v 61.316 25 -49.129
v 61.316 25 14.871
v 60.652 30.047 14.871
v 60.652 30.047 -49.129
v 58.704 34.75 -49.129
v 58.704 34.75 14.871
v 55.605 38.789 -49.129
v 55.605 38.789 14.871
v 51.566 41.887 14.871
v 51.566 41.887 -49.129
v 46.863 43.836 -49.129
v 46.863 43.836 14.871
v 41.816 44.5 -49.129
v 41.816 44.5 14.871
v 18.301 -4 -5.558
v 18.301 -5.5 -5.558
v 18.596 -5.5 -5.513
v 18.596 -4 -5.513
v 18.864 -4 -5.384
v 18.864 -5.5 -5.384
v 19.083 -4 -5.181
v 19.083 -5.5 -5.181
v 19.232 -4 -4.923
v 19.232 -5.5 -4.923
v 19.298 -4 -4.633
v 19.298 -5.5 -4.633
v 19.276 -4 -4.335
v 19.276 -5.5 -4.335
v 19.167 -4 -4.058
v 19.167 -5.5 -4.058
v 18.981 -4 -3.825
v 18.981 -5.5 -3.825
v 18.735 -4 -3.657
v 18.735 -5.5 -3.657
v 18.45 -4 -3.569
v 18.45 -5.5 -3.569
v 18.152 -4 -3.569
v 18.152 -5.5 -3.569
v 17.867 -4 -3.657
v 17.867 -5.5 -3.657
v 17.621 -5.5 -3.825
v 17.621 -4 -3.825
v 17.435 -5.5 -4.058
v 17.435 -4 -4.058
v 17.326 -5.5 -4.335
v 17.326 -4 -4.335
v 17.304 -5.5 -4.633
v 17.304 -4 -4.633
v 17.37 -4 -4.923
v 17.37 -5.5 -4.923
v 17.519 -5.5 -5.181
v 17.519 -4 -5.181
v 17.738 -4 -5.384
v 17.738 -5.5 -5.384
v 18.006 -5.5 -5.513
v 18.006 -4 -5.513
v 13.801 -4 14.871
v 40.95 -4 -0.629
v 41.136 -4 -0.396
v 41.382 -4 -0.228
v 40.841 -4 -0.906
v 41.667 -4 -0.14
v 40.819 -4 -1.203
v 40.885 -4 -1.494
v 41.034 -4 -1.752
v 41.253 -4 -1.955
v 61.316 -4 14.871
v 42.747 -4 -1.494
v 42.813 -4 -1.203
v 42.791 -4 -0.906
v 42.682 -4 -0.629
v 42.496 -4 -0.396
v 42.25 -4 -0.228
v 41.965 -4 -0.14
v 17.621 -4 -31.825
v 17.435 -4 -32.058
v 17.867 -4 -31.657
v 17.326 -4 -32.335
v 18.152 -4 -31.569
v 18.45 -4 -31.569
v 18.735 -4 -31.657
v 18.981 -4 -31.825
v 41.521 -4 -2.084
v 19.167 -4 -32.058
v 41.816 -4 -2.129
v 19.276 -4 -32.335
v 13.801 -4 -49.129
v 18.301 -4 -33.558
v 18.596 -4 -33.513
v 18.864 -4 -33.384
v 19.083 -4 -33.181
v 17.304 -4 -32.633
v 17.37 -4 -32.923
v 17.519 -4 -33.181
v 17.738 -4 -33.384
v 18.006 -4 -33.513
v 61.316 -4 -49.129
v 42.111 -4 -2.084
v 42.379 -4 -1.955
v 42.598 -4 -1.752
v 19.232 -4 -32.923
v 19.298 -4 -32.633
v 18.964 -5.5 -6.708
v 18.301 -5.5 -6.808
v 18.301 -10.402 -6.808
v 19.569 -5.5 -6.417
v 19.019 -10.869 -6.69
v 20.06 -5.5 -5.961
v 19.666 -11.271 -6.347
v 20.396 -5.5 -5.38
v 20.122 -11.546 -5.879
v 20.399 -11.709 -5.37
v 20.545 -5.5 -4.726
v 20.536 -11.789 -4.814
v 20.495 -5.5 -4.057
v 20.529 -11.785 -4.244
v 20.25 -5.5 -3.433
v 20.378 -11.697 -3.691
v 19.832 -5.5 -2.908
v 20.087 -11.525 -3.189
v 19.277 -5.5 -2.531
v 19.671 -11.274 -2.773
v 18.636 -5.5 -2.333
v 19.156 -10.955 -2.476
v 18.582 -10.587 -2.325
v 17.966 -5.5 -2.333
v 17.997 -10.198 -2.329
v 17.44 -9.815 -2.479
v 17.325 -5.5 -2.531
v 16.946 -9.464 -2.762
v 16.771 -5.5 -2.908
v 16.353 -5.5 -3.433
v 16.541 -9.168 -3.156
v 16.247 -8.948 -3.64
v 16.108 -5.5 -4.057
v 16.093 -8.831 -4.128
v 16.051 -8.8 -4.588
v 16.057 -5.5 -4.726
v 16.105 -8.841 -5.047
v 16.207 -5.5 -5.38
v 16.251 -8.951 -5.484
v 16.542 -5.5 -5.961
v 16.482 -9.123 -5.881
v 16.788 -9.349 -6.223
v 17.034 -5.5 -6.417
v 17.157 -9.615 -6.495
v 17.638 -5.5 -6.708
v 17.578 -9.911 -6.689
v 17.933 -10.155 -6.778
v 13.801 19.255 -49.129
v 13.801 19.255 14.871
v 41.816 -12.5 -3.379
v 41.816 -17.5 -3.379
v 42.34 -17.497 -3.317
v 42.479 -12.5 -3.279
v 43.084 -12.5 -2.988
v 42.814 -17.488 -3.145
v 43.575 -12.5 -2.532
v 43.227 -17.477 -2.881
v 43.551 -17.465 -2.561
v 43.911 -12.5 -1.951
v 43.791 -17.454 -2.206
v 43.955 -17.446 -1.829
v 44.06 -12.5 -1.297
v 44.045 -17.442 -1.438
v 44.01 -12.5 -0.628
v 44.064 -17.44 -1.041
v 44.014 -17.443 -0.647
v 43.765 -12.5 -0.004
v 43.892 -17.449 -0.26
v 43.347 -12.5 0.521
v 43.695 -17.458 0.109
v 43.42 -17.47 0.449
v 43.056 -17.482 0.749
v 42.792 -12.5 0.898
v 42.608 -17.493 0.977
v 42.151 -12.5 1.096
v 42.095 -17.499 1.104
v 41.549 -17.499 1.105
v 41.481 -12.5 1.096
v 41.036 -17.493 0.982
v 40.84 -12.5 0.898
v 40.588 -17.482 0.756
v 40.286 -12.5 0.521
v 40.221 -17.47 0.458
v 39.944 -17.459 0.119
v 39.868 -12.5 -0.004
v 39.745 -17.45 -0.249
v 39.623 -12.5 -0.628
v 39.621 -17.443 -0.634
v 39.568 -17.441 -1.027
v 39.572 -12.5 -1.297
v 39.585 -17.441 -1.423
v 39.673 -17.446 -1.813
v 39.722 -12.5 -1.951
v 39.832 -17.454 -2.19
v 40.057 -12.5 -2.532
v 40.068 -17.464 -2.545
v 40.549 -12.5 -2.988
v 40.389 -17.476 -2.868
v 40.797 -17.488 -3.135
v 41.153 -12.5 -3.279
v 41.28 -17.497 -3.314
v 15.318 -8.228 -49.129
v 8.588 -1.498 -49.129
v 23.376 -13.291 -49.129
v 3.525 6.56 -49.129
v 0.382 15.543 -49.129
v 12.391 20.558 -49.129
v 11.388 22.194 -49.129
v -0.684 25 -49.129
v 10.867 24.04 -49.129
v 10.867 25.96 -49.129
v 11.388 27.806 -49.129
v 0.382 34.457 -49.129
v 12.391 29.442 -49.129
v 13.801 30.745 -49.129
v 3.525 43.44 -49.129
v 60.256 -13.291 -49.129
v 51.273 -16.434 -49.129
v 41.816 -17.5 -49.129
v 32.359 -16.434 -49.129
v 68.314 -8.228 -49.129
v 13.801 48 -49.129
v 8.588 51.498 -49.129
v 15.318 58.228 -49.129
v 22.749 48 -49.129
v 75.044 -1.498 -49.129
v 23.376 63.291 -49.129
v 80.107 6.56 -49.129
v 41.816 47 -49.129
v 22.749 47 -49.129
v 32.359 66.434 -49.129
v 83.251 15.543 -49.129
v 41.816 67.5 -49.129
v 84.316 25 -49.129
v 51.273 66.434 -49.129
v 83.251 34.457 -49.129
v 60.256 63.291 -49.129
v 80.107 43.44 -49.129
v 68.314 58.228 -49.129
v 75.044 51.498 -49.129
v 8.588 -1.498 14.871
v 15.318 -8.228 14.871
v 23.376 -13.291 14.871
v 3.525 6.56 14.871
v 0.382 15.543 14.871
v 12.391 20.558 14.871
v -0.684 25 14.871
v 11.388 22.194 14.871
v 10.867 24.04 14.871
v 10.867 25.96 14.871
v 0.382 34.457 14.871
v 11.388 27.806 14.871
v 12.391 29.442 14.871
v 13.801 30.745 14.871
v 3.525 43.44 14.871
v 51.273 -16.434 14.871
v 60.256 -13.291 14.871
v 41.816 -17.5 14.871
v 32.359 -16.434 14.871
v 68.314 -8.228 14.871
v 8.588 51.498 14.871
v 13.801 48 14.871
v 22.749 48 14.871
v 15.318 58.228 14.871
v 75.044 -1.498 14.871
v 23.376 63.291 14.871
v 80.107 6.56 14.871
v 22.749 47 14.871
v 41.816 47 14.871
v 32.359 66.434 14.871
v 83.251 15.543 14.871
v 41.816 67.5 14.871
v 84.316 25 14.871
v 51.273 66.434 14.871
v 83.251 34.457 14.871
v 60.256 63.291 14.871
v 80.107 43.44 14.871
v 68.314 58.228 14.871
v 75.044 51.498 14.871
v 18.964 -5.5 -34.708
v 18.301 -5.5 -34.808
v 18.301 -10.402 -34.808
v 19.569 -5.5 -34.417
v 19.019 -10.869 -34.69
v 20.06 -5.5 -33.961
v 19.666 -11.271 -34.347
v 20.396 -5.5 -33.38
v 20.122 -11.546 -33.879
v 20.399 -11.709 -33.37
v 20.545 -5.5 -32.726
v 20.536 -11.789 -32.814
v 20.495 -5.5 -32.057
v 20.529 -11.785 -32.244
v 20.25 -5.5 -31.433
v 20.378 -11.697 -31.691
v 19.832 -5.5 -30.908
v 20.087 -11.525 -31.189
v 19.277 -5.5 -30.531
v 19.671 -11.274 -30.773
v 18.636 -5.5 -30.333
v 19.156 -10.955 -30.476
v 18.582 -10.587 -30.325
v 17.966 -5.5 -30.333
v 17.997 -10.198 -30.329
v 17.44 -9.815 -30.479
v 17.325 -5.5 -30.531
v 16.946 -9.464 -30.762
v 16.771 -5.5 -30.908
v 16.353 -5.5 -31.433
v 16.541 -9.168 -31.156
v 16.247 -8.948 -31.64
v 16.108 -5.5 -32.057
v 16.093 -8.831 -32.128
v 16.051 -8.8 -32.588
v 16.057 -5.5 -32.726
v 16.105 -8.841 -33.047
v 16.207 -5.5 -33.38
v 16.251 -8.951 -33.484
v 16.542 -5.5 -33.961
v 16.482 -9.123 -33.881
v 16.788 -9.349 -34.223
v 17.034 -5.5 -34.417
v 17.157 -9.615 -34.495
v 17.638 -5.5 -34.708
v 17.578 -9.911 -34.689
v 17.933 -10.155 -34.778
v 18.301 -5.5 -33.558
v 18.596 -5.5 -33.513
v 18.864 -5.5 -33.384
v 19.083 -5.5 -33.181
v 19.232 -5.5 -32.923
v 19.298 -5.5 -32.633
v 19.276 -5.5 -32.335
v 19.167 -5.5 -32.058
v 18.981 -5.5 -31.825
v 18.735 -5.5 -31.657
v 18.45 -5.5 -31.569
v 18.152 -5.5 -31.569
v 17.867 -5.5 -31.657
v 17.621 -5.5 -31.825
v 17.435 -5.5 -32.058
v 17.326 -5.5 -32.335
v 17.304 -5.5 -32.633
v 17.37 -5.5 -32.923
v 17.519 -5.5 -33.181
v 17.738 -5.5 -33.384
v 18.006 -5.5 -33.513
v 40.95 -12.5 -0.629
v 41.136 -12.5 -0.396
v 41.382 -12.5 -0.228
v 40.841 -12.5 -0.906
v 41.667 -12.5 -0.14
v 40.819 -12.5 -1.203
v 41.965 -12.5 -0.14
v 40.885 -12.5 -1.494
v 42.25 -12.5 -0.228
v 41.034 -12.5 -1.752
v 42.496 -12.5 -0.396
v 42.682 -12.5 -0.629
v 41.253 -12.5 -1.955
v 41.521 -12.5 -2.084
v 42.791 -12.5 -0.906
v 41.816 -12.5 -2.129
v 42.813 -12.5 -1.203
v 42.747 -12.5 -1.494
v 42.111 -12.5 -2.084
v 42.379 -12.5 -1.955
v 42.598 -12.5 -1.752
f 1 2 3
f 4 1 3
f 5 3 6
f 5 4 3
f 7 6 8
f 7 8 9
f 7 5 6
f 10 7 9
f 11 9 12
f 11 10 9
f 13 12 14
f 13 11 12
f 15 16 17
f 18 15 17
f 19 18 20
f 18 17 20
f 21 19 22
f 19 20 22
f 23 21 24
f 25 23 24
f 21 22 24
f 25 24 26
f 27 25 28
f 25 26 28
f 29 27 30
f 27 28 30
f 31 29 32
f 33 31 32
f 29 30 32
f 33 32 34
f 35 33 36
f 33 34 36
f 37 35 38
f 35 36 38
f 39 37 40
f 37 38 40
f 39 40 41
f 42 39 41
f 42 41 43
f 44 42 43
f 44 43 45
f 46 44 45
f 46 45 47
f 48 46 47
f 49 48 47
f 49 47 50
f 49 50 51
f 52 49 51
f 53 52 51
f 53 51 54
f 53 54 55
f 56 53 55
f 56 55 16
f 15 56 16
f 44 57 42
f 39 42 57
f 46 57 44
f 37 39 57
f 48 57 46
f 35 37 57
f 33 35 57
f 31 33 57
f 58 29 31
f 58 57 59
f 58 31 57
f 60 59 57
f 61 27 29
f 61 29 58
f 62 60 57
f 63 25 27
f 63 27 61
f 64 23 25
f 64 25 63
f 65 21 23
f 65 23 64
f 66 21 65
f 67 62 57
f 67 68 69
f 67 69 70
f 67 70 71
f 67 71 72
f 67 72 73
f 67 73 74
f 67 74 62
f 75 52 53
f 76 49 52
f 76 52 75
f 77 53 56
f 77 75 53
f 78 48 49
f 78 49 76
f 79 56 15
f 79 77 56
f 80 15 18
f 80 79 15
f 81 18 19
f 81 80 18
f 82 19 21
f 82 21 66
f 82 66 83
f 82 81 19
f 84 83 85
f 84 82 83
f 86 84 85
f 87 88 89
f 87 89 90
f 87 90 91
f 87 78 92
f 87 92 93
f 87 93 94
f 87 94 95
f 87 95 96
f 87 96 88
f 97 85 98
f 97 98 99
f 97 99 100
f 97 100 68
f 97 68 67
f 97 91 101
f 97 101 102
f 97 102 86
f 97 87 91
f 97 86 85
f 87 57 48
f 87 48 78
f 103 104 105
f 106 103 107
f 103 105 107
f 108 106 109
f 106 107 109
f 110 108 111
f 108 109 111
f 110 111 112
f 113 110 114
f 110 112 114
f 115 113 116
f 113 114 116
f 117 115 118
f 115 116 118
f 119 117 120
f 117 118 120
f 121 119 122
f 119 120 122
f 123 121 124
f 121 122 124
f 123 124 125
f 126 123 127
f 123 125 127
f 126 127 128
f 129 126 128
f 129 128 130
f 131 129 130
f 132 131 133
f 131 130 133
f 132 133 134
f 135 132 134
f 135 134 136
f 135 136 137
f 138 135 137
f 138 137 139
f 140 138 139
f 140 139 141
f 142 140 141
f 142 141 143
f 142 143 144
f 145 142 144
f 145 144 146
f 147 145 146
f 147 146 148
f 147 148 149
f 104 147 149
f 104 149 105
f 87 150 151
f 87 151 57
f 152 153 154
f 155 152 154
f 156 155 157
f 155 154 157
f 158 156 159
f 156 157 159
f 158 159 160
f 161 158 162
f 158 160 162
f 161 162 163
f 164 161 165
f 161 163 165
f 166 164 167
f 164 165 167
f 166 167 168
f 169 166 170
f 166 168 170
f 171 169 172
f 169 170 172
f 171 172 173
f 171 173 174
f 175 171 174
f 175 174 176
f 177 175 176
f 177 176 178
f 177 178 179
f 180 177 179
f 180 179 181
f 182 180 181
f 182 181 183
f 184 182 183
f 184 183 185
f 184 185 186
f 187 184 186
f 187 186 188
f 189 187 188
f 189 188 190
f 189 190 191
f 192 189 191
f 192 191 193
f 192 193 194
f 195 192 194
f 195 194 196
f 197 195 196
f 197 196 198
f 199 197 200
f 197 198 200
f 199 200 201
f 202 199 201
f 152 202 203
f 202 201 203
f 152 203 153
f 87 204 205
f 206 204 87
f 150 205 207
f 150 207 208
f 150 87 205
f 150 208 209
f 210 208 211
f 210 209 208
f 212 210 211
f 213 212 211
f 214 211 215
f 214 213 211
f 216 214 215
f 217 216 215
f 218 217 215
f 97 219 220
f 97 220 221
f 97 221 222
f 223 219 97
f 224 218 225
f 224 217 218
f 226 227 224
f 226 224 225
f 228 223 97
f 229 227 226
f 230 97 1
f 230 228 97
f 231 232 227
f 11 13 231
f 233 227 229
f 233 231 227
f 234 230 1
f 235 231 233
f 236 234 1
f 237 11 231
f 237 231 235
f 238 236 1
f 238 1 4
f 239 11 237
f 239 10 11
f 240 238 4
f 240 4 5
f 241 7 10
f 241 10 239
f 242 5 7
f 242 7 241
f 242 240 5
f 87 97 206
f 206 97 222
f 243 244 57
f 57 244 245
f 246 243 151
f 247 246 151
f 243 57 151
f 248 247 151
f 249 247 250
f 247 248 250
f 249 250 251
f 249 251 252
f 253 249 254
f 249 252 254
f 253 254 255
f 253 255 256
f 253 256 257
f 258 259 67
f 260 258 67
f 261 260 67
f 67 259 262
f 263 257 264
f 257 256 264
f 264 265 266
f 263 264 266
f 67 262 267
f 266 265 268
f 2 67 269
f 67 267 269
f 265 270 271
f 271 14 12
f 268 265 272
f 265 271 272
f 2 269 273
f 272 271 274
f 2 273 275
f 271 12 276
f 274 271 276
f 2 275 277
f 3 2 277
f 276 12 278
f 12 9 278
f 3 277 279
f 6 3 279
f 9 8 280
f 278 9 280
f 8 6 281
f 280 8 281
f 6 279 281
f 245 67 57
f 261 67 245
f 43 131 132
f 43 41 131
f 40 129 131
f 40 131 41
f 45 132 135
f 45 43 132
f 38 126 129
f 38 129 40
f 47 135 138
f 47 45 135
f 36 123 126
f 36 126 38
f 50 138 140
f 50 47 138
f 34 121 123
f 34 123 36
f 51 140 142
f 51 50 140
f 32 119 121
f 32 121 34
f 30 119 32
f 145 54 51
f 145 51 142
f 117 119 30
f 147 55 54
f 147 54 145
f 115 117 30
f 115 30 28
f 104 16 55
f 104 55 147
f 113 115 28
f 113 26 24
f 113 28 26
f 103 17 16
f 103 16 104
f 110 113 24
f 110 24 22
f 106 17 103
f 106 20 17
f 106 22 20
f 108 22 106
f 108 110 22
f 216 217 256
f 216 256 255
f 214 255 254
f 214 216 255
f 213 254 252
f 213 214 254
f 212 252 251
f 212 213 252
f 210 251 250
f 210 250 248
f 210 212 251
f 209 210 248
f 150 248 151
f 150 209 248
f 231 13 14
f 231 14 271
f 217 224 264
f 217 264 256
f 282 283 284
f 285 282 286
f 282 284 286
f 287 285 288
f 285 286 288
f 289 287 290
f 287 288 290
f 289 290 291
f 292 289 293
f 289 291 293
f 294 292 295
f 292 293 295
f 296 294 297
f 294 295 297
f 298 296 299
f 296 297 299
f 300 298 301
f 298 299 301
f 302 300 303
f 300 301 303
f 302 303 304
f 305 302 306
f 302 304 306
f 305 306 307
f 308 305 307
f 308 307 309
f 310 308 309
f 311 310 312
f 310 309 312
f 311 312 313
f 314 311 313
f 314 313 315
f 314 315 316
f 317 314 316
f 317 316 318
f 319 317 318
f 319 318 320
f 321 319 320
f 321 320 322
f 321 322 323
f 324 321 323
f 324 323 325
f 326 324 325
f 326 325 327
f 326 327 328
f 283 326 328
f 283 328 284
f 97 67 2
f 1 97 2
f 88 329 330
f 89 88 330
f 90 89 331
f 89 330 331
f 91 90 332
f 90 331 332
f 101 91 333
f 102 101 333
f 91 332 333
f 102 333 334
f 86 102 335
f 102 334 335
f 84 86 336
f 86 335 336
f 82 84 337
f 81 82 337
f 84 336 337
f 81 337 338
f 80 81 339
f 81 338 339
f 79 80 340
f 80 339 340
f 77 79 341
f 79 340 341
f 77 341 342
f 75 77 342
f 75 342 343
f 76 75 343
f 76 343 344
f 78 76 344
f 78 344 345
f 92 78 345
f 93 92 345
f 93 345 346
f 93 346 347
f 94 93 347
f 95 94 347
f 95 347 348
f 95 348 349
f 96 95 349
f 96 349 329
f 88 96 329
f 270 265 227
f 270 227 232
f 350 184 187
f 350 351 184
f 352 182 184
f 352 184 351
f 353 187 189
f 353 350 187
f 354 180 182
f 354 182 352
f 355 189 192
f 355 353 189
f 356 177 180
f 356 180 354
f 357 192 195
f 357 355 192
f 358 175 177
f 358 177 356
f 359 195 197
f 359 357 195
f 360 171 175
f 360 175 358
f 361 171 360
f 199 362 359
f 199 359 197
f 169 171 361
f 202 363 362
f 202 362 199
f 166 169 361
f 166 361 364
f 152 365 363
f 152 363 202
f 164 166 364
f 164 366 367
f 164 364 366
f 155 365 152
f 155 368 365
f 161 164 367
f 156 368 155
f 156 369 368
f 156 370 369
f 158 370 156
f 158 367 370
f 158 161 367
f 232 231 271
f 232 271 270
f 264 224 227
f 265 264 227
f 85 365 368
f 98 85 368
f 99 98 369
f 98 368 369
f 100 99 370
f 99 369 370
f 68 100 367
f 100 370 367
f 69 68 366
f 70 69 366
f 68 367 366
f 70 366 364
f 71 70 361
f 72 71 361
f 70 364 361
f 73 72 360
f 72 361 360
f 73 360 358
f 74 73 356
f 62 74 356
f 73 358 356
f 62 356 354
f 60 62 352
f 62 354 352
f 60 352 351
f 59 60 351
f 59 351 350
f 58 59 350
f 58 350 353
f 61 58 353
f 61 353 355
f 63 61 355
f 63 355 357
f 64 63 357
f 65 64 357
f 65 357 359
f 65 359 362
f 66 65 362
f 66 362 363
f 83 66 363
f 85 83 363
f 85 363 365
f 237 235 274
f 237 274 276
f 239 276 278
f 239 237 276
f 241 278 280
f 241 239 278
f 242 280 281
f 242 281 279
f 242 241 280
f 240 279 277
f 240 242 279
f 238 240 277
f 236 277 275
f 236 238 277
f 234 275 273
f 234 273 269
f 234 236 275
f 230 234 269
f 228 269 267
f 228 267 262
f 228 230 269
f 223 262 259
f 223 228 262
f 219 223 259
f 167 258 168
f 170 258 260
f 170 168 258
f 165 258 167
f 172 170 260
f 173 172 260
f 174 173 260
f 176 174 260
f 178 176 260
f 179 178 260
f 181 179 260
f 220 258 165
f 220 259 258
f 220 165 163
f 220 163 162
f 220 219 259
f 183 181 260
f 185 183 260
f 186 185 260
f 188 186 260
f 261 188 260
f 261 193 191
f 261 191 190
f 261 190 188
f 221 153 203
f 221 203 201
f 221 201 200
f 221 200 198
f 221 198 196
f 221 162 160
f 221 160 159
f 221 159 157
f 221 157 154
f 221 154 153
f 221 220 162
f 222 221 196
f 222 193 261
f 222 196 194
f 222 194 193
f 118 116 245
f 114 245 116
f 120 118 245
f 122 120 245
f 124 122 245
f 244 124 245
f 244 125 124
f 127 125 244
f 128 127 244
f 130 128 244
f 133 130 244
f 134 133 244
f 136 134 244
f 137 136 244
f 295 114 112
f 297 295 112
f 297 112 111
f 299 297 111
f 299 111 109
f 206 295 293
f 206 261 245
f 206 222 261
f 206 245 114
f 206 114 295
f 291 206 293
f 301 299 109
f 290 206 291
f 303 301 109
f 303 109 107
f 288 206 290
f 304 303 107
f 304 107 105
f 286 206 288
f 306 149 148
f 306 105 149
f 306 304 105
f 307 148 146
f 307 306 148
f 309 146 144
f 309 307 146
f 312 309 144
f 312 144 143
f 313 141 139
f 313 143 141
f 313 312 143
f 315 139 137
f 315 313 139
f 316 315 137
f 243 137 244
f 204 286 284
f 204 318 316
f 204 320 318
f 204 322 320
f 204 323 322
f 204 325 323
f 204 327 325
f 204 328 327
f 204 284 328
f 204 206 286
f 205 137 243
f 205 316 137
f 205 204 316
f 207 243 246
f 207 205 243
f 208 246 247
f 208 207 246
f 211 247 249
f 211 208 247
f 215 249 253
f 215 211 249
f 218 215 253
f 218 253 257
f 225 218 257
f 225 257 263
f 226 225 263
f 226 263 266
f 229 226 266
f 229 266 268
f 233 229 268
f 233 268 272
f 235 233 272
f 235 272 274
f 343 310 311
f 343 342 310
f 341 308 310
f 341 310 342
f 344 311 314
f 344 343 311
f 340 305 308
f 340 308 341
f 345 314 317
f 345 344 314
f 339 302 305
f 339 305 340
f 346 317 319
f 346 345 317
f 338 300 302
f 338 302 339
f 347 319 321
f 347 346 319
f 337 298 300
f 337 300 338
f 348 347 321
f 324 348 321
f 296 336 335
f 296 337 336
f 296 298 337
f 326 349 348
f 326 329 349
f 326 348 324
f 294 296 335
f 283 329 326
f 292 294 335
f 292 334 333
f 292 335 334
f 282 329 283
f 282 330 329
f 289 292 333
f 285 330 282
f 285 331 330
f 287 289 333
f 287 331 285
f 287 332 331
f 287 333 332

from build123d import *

# Parameters (mm, degrees)
SKETCH1_R           = 42.5
BOSS_EXTRUDE1_DEPTH = 64
SKETCH2_R           = 1
CUT_EXTRUDE1_DEPTH  = 13.5
SKETCH3_R           = 2.25
CUT_EXTRUDE2_DEPTH  = 5
SKETCH4_R           = 2.25
CUT_EXTRUDE3_DEPTH  = 12
CUT_EXTRUDE4_DEPTH  = 126.544655058


with BuildPart() as part:
    # Sketch1 → Boss-Extrude1 (new body)
    with BuildSketch(Plane(origin=(0, 0, -49.128748399), x_dir=(-1, 0, 0), z_dir=(0, 0, -1))):
        with Locations(Location((-41.816133513, 25, 0), (0, 0, 90))):
            Circle(SKETCH1_R)
        with BuildLine():
            Line((-13.801141106, 15.83484861), (-13.801141106, -4))
            Line((-13.801141106, -4), (-61.316133513, -4))
            Line((-61.316133513, -4), (-61.316133513, 25))
            ThreePointArc((-61.316133513, 25), (-55.604715746, 38.788582233), (-41.816133513, 44.5))
            Line((-41.816133513, 44.5), (-41.816133513, 47.000001781))
            Line((-41.816133513, 47.000001781), (-13.801141106, 47.000001781))
            Line((-13.801141106, 47.000001781), (-13.801141106, 34.16515139))
            Line((-13.801141106, 34.16515139), (-13.801141106, 30.744562647))
            ThreePointArc((-13.801141106, 30.744562647), (-10.801141106, 25), (-13.801141106, 19.255437353))
            Line((-13.801141106, 19.255437353), (-13.801141106, 15.83484861))
        make_face(mode=Mode.SUBTRACT)
    extrude(amount=-BOSS_EXTRUDE1_DEPTH)

    # Sketch2 → Cut-Extrude1 (cut)
    with BuildSketch(Plane(origin=(0, -17.5, 0), x_dir=(-1, 0, 0), z_dir=(0, -1, 0))):
        with Locations(Location((-18.301141106, 4.557815864, 0), (0, 0, 90))):
            Circle(SKETCH2_R)
        with Locations(Location((-18.301141106, 32.557815864, 0), (0, 0, 90))):
            Circle(SKETCH2_R)
        with Locations(Location((-41.816133513, 1.128748399, 0), (0, 0, 90))):
            Circle(SKETCH2_R)
    extrude(amount=-CUT_EXTRUDE1_DEPTH, mode=Mode.SUBTRACT)

    # Sketch3 → Cut-Extrude2 (cut)
    with BuildSketch(Plane(origin=(0, -17.5, 0), x_dir=(-1, 0, 0), z_dir=(0, -1, 0))):
        with Locations(Location((-41.816133513, 1.128748399, 0), (0, 0, 90))):
            Circle(SKETCH3_R)
        with Locations((-18.301141106, 4.557815864)):
            Circle(SKETCH3_R)
        with Locations((-18.301141106, 32.557815864)):
            Circle(SKETCH3_R)
    extrude(amount=-CUT_EXTRUDE2_DEPTH, mode=Mode.SUBTRACT)

    # Sketch4 → Cut-Extrude3 (cut)
    with BuildSketch(Plane(origin=(0, -17.5, 0), x_dir=(-1, 0, 0), z_dir=(0, -1, 0))):
        with Locations(Location((-18.301141106, 4.557815864, 0), (0, 0, 90))):
            Circle(SKETCH4_R)
        with Locations(Location((-18.301141106, 32.557815864, 0), (0, 0, 90))):
            Circle(SKETCH4_R)
    extrude(amount=-CUT_EXTRUDE3_DEPTH, mode=Mode.SUBTRACT)

    # Sketch5 → Cut-Extrude4 (cut, through all)
    with BuildSketch(Plane(origin=(0, 0, -49.128748399), x_dir=(-1, 0, 0), z_dir=(0, 0, -1))):
        Polygon((-21.801141106, 47.000001781), (-13.801141106, 47.000001781), (-13.801141106, 48.000001781), (-21.801141106, 48.000001781), (-22.748659585, 48.000001781), (-22.748659585, 47.000001781), align=None)
    extrude(amount=-CUT_EXTRUDE4_DEPTH, mode=Mode.SUBTRACT)


solid = part.part
